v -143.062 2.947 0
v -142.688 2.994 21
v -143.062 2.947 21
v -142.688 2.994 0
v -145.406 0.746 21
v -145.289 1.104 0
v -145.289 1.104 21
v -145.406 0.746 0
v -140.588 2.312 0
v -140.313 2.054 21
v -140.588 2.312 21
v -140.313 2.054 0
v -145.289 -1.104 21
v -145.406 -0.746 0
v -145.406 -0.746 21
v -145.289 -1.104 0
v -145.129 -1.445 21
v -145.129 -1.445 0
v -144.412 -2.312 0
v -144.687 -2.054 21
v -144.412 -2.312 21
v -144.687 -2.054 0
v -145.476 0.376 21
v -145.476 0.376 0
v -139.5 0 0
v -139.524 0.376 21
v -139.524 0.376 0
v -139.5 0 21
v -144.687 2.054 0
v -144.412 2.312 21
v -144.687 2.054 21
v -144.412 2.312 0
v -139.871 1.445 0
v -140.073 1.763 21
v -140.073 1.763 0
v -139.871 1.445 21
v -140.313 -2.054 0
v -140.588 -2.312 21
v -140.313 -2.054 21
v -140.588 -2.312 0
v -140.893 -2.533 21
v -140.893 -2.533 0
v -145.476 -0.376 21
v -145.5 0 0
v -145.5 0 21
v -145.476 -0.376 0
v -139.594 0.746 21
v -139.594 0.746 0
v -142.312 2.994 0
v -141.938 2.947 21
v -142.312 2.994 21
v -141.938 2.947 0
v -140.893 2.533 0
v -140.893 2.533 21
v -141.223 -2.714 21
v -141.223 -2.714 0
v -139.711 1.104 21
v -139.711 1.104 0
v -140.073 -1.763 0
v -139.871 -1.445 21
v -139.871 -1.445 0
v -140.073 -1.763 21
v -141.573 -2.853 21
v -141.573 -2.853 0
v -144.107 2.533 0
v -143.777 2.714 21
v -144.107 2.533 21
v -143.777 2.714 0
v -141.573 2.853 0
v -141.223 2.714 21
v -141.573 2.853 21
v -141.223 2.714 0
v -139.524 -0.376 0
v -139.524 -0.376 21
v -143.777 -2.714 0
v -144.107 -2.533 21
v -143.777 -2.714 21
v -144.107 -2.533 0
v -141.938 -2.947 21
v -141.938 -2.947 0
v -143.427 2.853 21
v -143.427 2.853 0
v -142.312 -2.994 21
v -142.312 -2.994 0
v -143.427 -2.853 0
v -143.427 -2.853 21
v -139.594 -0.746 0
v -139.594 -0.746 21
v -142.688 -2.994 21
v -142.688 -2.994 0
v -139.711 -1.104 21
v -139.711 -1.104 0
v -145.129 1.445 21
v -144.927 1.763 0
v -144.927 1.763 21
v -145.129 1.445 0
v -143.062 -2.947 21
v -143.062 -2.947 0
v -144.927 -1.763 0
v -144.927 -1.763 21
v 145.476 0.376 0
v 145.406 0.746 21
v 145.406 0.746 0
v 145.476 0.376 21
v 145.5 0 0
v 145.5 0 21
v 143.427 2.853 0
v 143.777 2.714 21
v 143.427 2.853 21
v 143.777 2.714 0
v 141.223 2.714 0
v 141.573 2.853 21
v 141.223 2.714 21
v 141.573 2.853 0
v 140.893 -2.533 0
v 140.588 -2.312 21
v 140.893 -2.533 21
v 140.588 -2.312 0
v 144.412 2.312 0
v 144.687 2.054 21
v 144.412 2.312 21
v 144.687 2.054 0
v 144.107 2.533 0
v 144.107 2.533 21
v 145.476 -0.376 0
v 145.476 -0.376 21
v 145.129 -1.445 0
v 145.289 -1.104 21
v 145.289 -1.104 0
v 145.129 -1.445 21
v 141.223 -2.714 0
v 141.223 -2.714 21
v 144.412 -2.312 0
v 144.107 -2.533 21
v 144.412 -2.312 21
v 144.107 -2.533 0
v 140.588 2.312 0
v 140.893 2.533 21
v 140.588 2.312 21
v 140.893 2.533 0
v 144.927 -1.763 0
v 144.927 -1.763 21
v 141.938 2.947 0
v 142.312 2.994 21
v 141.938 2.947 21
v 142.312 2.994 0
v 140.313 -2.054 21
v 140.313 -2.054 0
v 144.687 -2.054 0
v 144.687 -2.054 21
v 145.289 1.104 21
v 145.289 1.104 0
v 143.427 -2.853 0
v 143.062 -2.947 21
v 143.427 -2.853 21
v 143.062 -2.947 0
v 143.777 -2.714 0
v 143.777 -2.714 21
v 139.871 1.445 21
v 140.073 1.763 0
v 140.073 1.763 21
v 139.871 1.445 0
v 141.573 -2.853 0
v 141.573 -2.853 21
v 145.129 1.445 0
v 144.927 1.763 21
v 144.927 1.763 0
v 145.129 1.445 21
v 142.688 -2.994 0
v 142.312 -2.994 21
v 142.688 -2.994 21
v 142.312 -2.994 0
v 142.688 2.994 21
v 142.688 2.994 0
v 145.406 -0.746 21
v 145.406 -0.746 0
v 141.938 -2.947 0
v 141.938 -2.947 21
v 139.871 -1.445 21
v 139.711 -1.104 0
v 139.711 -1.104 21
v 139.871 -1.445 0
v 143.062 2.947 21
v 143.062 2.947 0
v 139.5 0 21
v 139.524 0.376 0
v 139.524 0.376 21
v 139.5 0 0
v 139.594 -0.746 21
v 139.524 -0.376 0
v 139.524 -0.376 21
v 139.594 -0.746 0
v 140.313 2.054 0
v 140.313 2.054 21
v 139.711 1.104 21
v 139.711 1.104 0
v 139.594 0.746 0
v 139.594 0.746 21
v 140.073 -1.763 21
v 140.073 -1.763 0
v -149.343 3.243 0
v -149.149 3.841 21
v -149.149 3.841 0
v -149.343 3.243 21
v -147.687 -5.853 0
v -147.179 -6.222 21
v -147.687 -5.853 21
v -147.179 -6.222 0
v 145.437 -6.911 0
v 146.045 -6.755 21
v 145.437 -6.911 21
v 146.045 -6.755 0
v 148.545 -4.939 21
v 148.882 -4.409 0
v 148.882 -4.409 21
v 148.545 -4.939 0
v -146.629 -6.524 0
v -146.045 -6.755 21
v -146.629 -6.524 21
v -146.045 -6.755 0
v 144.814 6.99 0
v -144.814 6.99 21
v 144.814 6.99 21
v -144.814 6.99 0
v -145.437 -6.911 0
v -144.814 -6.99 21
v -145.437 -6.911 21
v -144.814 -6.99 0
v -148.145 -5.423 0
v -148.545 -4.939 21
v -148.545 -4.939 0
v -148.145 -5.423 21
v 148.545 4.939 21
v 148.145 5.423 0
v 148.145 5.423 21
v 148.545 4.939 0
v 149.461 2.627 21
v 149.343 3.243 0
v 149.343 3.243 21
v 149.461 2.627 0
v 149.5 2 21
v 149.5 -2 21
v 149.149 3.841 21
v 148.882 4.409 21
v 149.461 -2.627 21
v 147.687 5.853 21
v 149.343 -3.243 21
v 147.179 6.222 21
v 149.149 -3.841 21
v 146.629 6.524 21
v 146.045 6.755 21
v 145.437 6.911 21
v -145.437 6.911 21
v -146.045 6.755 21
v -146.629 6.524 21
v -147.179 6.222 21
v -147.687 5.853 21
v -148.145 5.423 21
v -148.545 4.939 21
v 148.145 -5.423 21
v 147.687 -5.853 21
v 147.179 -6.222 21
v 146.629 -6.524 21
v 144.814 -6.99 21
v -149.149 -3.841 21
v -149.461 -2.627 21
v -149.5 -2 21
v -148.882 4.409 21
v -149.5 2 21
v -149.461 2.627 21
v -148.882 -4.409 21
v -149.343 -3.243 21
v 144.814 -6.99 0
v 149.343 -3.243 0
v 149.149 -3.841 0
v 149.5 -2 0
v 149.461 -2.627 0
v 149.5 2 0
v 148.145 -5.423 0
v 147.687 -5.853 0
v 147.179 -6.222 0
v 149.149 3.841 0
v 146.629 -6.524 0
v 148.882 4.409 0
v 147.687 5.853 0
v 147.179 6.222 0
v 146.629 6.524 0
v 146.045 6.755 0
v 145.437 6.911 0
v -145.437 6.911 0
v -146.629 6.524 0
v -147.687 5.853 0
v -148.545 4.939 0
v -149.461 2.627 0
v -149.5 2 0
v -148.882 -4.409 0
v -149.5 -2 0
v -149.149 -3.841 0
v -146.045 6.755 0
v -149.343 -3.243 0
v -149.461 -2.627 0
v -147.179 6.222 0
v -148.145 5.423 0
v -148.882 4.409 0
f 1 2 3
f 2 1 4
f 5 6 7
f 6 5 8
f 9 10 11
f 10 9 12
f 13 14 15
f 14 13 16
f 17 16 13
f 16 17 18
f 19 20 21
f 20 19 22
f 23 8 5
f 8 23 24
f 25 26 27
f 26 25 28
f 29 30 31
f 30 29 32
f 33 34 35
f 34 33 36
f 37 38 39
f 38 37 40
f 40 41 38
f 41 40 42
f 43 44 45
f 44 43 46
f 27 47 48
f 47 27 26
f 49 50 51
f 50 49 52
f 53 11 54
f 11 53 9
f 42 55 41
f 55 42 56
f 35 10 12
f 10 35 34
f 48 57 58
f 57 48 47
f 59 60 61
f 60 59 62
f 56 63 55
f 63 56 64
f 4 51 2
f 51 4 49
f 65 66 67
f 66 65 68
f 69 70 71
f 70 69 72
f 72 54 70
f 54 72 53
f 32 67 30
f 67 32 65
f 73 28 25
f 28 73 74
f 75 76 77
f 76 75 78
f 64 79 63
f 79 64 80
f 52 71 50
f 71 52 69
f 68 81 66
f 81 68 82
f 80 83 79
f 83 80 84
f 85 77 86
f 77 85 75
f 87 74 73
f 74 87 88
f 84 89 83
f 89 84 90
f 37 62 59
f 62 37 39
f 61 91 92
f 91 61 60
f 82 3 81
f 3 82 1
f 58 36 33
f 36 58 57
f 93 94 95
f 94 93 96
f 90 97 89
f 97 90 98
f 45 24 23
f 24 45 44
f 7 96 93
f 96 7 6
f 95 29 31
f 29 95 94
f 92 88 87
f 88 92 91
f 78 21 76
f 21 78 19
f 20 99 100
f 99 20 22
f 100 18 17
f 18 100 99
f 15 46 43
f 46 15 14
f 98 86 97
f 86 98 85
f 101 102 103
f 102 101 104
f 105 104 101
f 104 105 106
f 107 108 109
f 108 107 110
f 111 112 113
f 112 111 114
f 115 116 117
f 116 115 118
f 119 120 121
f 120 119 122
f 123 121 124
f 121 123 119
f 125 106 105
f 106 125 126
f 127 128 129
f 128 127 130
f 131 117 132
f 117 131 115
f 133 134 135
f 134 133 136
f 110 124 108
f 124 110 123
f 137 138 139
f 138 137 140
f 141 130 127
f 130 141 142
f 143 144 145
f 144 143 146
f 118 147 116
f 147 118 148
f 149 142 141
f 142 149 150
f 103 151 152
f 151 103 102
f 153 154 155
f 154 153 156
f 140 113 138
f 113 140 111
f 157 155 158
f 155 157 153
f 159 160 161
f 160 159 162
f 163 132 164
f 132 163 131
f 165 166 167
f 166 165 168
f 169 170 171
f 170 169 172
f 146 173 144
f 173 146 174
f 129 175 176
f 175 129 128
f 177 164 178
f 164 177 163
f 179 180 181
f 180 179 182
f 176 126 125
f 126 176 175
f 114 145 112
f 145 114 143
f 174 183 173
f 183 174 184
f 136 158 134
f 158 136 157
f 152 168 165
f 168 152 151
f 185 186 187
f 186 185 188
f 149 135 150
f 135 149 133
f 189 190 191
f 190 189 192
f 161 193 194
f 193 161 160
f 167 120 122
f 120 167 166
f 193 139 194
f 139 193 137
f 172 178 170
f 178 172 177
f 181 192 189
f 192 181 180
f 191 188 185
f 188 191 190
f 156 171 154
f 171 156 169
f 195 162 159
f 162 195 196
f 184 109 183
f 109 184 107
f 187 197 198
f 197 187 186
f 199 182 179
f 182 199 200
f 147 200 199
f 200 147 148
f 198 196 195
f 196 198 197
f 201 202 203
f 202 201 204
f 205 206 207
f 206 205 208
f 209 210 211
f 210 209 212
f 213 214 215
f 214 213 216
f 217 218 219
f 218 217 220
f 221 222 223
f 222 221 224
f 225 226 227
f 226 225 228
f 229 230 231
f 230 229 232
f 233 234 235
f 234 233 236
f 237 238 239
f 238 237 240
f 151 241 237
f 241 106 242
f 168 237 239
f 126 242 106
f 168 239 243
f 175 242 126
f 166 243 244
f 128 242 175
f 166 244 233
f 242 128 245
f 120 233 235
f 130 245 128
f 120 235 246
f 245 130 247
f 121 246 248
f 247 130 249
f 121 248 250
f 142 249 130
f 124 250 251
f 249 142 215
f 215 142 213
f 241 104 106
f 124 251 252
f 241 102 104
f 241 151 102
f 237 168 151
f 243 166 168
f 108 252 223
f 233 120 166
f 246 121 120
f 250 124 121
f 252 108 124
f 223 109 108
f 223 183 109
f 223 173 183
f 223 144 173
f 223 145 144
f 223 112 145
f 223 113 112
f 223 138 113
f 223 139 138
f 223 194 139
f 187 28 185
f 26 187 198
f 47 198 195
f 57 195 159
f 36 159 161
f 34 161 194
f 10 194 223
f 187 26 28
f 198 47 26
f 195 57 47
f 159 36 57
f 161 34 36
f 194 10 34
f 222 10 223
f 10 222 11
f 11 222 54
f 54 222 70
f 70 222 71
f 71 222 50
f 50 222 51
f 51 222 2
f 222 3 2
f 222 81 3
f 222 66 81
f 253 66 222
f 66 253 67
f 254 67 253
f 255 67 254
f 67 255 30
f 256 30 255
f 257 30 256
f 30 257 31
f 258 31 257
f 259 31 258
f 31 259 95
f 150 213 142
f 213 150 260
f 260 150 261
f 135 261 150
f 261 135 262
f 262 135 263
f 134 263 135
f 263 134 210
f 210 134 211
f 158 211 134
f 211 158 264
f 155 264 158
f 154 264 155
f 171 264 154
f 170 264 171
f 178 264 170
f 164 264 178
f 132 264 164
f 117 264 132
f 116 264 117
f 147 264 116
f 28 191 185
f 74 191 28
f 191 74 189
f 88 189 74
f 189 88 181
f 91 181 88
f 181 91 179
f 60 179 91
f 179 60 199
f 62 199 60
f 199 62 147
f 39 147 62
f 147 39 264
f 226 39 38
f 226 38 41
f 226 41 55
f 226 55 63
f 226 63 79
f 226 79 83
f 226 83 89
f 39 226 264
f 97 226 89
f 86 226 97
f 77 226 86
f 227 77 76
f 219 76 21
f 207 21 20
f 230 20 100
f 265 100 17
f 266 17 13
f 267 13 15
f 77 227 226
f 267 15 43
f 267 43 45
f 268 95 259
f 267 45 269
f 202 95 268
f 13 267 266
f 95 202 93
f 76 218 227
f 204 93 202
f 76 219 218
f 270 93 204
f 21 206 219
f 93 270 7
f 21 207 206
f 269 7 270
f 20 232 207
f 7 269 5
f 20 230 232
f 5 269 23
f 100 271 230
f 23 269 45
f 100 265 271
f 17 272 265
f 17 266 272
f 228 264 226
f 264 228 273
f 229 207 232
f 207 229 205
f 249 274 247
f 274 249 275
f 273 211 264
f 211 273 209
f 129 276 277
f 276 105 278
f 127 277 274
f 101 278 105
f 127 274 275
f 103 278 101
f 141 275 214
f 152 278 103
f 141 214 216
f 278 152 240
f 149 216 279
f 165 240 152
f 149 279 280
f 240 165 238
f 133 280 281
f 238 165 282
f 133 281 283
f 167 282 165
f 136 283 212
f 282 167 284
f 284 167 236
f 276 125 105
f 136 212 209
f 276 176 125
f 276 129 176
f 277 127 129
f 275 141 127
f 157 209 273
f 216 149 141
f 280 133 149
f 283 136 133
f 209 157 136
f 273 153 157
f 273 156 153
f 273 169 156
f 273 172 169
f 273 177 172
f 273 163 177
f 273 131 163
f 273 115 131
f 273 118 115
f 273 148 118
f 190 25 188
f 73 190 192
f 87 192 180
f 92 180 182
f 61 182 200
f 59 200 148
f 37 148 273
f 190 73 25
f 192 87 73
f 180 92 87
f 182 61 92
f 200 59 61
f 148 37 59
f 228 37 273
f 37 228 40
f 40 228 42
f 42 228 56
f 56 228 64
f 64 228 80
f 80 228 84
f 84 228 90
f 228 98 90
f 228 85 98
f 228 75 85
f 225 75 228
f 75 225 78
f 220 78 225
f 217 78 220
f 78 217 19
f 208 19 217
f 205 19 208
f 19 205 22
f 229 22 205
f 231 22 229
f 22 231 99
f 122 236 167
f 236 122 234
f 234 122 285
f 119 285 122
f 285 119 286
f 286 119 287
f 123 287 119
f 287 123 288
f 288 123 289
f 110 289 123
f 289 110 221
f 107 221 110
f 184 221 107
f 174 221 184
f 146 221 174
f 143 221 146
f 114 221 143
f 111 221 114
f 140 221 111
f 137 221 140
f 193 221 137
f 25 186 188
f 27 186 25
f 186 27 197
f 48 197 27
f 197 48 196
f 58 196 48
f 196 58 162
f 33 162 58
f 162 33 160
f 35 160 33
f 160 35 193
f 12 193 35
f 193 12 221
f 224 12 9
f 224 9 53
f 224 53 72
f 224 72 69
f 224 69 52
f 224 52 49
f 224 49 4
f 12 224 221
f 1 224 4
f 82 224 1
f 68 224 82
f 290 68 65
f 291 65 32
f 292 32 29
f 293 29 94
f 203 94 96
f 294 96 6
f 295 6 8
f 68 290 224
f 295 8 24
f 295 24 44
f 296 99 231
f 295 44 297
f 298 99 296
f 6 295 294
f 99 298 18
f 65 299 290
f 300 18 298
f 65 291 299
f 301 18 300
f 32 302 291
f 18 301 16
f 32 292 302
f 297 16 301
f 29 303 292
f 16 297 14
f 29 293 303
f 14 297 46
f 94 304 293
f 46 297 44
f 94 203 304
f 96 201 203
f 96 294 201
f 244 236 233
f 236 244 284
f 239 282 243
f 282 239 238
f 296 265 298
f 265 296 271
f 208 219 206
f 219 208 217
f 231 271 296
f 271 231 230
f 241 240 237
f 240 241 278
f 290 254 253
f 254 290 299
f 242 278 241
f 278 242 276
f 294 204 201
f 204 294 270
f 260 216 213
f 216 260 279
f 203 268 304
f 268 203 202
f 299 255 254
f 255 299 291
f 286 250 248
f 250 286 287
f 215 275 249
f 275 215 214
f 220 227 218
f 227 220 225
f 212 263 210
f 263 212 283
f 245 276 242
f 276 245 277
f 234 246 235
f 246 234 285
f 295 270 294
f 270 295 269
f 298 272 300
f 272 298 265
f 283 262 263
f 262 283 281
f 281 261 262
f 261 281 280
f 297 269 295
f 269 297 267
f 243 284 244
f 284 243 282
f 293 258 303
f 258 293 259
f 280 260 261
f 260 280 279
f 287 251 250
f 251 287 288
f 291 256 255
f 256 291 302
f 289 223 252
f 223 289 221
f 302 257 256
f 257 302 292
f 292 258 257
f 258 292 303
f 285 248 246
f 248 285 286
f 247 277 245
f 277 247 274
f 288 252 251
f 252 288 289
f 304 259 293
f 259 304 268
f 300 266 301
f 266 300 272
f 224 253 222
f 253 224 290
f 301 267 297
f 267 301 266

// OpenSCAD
$fn = 50;


difference() {
	union() {
		hull() {
			translate(v = [-144.5000000000, 2.0000000000, 0]) {
				cylinder(h = 21, r = 5);
			}
			translate(v = [144.5000000000, 2.0000000000, 0]) {
				cylinder(h = 21, r = 5);
			}
			translate(v = [-144.5000000000, -2.0000000000, 0]) {
				cylinder(h = 21, r = 5);
			}
			translate(v = [144.5000000000, -2.0000000000, 0]) {
				cylinder(h = 21, r = 5);
			}
		}
	}
	union() {
		translate(v = [-142.5000000000, 0.0000000000, -100.0000000000]) {
			cylinder(h = 200, r = 3.0000000000);
		}
		translate(v = [-142.5000000000, 0.0000000000, -100.0000000000]) {
			cylinder(h = 200, r = 3.0000000000);
		}
		translate(v = [142.5000000000, 0.0000000000, -100.0000000000]) {
			cylinder(h = 200, r = 3.0000000000);
		}
		translate(v = [142.5000000000, 0.0000000000, -100.0000000000]) {
			cylinder(h = 200, r = 3.0000000000);
		}
	}
}
